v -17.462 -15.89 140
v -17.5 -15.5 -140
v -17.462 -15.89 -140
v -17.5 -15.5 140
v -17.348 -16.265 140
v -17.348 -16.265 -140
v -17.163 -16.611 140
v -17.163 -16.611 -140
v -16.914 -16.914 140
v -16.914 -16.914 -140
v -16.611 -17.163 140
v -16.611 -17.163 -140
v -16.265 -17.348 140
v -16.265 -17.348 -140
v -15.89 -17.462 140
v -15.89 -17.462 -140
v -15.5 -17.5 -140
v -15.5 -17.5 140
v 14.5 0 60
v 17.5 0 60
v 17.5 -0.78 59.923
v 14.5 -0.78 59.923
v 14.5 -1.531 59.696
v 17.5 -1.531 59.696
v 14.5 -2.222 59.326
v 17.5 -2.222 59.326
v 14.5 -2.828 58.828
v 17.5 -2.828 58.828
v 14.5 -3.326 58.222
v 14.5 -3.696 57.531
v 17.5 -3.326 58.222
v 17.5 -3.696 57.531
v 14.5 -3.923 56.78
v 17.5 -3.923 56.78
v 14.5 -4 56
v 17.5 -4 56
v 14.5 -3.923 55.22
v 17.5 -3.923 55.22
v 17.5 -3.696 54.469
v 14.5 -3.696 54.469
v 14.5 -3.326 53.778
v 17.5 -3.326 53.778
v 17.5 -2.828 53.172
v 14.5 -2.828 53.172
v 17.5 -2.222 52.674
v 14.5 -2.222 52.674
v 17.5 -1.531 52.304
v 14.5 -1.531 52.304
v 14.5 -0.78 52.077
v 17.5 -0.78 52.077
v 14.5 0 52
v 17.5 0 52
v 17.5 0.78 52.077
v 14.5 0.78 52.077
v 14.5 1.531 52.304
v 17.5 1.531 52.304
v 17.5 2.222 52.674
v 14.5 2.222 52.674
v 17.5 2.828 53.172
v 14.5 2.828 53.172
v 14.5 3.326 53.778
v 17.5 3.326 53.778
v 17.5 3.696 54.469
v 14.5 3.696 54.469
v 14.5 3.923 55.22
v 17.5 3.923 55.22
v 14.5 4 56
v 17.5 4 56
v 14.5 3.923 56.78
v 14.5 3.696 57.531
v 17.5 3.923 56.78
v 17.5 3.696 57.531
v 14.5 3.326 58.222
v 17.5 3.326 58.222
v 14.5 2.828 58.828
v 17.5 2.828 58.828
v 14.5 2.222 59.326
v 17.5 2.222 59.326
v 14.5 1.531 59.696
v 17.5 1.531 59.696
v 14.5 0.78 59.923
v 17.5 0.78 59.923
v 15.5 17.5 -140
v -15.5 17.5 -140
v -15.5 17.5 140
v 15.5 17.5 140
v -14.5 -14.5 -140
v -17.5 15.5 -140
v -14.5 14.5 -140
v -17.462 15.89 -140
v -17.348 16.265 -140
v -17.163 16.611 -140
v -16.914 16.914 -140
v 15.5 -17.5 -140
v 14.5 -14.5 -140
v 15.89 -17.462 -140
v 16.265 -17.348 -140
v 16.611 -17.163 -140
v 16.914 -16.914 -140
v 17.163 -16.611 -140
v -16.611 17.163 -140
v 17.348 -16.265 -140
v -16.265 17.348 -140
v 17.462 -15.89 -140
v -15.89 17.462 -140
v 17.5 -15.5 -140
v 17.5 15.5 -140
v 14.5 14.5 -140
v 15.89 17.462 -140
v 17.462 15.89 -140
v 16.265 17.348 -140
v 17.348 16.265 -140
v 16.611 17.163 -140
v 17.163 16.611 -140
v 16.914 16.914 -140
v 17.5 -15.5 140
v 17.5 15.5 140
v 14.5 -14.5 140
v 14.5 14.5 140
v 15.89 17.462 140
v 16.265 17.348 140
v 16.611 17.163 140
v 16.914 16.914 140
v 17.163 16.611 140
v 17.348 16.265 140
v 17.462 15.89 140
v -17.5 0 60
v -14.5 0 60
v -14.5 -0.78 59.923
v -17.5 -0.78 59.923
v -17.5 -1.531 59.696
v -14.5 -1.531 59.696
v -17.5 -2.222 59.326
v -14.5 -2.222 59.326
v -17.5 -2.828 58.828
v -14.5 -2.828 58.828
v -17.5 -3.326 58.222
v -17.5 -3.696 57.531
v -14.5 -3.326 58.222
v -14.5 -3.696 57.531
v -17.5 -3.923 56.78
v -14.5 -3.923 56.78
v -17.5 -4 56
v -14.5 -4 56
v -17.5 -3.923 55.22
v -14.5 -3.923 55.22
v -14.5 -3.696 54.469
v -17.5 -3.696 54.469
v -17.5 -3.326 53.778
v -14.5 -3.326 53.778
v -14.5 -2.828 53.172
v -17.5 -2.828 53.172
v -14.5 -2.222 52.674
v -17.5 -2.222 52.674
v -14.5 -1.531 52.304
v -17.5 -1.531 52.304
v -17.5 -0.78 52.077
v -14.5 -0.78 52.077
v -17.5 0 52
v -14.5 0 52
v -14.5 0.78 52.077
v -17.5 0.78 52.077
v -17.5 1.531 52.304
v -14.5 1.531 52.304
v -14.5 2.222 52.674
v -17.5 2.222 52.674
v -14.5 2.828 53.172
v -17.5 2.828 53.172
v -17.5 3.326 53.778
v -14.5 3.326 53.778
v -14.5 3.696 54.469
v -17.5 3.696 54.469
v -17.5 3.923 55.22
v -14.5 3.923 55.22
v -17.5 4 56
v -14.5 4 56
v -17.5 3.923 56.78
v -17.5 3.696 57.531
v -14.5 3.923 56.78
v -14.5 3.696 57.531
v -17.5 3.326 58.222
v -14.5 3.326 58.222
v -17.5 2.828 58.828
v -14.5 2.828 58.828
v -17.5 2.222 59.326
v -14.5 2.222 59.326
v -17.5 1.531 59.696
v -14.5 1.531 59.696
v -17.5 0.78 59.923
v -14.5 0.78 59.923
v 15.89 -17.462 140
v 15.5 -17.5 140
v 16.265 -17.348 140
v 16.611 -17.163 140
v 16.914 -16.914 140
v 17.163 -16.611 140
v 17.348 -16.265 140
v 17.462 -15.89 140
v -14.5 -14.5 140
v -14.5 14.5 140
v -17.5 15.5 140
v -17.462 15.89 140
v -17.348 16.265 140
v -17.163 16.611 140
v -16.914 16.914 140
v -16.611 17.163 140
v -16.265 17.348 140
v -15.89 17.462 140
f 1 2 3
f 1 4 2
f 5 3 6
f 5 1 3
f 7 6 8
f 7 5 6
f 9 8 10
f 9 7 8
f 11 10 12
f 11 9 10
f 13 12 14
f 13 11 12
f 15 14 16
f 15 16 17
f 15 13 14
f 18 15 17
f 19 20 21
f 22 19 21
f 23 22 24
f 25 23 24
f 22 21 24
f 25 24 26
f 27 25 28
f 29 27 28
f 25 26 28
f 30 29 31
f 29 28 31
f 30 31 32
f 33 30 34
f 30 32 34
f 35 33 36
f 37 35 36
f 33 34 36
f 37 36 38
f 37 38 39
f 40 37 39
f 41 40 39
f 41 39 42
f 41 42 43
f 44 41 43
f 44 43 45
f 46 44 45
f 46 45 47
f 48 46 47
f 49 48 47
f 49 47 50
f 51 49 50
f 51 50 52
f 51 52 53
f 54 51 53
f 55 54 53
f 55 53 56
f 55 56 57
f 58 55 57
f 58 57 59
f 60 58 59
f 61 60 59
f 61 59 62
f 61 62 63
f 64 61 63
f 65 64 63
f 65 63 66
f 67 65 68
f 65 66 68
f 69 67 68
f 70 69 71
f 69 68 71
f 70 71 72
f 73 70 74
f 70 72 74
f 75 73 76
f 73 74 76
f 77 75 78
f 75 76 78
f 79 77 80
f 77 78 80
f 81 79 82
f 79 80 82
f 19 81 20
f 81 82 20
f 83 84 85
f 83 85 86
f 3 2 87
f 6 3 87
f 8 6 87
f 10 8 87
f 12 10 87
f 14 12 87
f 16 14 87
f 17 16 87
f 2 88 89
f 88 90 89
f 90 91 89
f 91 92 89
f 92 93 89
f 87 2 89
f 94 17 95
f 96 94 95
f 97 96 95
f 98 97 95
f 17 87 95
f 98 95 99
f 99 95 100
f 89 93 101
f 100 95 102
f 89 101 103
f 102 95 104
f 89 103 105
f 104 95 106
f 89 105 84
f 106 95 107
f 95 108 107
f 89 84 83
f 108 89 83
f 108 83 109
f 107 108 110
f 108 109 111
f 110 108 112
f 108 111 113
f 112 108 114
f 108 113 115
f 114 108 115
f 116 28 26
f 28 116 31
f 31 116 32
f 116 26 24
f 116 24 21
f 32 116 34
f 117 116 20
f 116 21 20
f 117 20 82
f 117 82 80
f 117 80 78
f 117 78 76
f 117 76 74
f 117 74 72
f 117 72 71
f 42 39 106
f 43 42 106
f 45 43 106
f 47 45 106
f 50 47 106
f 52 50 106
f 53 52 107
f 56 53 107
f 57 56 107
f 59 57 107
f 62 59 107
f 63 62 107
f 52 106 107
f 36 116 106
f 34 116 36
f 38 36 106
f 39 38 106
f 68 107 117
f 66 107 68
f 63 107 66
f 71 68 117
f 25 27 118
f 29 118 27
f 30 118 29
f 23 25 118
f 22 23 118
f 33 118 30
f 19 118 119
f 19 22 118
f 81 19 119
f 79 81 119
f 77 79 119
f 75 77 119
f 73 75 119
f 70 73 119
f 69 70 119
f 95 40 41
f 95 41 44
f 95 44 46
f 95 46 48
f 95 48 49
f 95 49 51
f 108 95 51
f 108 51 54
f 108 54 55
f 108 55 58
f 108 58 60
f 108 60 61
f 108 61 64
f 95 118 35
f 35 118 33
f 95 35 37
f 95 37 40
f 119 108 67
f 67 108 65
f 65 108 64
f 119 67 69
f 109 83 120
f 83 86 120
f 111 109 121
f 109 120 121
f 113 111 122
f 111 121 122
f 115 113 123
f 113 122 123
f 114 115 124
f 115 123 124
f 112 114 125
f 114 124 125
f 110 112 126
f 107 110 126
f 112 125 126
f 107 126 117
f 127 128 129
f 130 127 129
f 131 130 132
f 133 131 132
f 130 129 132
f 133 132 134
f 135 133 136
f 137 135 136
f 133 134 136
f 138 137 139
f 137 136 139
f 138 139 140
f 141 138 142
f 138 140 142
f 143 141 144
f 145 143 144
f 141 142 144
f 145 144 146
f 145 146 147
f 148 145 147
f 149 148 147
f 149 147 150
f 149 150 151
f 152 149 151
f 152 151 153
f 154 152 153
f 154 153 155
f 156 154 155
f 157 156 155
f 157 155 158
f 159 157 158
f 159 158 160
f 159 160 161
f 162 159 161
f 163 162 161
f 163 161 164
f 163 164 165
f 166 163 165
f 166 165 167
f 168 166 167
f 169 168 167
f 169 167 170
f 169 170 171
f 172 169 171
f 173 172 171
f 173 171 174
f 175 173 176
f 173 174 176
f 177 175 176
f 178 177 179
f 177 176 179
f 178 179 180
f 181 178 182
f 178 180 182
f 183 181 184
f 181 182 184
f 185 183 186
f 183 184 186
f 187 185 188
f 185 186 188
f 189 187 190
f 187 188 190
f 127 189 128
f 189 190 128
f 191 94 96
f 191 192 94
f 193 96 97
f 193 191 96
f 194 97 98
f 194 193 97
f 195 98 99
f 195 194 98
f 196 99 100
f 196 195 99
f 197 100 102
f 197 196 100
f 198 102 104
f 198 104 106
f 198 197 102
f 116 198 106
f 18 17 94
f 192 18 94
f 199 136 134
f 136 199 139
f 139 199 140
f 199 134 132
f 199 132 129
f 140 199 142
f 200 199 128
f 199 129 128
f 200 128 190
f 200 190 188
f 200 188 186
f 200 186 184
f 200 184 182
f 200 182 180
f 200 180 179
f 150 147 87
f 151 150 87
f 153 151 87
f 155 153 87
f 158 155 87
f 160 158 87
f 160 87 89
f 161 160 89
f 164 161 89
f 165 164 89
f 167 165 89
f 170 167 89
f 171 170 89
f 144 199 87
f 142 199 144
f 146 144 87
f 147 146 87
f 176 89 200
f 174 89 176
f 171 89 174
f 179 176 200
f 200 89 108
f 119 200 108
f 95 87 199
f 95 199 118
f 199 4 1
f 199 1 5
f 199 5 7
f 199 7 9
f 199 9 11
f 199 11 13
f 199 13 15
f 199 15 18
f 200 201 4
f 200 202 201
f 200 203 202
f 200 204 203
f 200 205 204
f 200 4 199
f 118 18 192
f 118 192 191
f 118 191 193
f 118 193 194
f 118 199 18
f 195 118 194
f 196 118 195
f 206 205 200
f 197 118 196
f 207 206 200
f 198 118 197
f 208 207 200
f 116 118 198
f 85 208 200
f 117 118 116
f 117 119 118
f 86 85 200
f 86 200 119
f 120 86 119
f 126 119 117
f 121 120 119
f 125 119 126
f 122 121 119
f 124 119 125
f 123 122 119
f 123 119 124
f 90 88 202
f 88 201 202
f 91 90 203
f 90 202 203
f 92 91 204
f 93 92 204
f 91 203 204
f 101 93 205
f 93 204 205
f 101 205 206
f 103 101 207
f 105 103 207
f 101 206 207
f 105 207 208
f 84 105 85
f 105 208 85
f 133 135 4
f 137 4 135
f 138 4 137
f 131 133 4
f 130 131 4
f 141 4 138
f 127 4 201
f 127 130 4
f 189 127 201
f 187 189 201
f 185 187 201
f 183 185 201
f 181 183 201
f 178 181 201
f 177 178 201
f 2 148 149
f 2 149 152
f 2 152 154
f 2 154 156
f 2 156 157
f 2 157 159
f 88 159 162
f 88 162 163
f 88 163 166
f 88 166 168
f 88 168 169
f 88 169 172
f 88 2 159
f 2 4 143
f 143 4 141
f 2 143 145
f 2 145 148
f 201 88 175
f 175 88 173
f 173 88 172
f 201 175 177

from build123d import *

# Parameters (mm, degrees)
EXTRUDE_THIN1_DEPTH      = 140
EXTRUDE_THIN1_DEPTH_BACK = 140
SKETCH1_W                = 35
SKETCH1_H                = 35
SKETCH1_W_2              = 29
SKETCH1_H_2              = 29
FILLET1_R                = 2
SKETCH2_R                = 4
CUT_EXTRUDE1_DEPTH       = 40


with BuildPart() as part:
    # Sketch1 → Extrude-Thin1 (new, two sides: drawn at the far end of the back side and taken through both)
    with BuildSketch(Plane.XY.offset(-EXTRUDE_THIN1_DEPTH_BACK)):
        Rectangle(SKETCH1_W, SKETCH1_H)
        Rectangle(SKETCH1_W_2, SKETCH1_H_2, mode=Mode.SUBTRACT)
    extrude(amount=EXTRUDE_THIN1_DEPTH + EXTRUDE_THIN1_DEPTH_BACK)

    # Fillet1
    fillet1_edges = [part.edges().sort_by_distance(p)[0] for p in [
        (17.5, -17.5, 0),
        (-17.5, -17.5, 0),
        (-17.5, 17.5, 0),
        (17.5, 17.5, 0),
    ]]
    fillet(fillet1_edges, radius=FILLET1_R)

    # Sketch2 → Cut-Extrude1 (cut)
    with BuildSketch(Plane(origin=(17.5, 0, 0), x_dir=(0, 0, -1), z_dir=(1, 0, 0))):
        with Locations(Location((-56, 0, 0), (0, 0, 180))):
            Circle(SKETCH2_R)
    extrude(amount=-CUT_EXTRUDE1_DEPTH, mode=Mode.SUBTRACT)


solid = part.part
